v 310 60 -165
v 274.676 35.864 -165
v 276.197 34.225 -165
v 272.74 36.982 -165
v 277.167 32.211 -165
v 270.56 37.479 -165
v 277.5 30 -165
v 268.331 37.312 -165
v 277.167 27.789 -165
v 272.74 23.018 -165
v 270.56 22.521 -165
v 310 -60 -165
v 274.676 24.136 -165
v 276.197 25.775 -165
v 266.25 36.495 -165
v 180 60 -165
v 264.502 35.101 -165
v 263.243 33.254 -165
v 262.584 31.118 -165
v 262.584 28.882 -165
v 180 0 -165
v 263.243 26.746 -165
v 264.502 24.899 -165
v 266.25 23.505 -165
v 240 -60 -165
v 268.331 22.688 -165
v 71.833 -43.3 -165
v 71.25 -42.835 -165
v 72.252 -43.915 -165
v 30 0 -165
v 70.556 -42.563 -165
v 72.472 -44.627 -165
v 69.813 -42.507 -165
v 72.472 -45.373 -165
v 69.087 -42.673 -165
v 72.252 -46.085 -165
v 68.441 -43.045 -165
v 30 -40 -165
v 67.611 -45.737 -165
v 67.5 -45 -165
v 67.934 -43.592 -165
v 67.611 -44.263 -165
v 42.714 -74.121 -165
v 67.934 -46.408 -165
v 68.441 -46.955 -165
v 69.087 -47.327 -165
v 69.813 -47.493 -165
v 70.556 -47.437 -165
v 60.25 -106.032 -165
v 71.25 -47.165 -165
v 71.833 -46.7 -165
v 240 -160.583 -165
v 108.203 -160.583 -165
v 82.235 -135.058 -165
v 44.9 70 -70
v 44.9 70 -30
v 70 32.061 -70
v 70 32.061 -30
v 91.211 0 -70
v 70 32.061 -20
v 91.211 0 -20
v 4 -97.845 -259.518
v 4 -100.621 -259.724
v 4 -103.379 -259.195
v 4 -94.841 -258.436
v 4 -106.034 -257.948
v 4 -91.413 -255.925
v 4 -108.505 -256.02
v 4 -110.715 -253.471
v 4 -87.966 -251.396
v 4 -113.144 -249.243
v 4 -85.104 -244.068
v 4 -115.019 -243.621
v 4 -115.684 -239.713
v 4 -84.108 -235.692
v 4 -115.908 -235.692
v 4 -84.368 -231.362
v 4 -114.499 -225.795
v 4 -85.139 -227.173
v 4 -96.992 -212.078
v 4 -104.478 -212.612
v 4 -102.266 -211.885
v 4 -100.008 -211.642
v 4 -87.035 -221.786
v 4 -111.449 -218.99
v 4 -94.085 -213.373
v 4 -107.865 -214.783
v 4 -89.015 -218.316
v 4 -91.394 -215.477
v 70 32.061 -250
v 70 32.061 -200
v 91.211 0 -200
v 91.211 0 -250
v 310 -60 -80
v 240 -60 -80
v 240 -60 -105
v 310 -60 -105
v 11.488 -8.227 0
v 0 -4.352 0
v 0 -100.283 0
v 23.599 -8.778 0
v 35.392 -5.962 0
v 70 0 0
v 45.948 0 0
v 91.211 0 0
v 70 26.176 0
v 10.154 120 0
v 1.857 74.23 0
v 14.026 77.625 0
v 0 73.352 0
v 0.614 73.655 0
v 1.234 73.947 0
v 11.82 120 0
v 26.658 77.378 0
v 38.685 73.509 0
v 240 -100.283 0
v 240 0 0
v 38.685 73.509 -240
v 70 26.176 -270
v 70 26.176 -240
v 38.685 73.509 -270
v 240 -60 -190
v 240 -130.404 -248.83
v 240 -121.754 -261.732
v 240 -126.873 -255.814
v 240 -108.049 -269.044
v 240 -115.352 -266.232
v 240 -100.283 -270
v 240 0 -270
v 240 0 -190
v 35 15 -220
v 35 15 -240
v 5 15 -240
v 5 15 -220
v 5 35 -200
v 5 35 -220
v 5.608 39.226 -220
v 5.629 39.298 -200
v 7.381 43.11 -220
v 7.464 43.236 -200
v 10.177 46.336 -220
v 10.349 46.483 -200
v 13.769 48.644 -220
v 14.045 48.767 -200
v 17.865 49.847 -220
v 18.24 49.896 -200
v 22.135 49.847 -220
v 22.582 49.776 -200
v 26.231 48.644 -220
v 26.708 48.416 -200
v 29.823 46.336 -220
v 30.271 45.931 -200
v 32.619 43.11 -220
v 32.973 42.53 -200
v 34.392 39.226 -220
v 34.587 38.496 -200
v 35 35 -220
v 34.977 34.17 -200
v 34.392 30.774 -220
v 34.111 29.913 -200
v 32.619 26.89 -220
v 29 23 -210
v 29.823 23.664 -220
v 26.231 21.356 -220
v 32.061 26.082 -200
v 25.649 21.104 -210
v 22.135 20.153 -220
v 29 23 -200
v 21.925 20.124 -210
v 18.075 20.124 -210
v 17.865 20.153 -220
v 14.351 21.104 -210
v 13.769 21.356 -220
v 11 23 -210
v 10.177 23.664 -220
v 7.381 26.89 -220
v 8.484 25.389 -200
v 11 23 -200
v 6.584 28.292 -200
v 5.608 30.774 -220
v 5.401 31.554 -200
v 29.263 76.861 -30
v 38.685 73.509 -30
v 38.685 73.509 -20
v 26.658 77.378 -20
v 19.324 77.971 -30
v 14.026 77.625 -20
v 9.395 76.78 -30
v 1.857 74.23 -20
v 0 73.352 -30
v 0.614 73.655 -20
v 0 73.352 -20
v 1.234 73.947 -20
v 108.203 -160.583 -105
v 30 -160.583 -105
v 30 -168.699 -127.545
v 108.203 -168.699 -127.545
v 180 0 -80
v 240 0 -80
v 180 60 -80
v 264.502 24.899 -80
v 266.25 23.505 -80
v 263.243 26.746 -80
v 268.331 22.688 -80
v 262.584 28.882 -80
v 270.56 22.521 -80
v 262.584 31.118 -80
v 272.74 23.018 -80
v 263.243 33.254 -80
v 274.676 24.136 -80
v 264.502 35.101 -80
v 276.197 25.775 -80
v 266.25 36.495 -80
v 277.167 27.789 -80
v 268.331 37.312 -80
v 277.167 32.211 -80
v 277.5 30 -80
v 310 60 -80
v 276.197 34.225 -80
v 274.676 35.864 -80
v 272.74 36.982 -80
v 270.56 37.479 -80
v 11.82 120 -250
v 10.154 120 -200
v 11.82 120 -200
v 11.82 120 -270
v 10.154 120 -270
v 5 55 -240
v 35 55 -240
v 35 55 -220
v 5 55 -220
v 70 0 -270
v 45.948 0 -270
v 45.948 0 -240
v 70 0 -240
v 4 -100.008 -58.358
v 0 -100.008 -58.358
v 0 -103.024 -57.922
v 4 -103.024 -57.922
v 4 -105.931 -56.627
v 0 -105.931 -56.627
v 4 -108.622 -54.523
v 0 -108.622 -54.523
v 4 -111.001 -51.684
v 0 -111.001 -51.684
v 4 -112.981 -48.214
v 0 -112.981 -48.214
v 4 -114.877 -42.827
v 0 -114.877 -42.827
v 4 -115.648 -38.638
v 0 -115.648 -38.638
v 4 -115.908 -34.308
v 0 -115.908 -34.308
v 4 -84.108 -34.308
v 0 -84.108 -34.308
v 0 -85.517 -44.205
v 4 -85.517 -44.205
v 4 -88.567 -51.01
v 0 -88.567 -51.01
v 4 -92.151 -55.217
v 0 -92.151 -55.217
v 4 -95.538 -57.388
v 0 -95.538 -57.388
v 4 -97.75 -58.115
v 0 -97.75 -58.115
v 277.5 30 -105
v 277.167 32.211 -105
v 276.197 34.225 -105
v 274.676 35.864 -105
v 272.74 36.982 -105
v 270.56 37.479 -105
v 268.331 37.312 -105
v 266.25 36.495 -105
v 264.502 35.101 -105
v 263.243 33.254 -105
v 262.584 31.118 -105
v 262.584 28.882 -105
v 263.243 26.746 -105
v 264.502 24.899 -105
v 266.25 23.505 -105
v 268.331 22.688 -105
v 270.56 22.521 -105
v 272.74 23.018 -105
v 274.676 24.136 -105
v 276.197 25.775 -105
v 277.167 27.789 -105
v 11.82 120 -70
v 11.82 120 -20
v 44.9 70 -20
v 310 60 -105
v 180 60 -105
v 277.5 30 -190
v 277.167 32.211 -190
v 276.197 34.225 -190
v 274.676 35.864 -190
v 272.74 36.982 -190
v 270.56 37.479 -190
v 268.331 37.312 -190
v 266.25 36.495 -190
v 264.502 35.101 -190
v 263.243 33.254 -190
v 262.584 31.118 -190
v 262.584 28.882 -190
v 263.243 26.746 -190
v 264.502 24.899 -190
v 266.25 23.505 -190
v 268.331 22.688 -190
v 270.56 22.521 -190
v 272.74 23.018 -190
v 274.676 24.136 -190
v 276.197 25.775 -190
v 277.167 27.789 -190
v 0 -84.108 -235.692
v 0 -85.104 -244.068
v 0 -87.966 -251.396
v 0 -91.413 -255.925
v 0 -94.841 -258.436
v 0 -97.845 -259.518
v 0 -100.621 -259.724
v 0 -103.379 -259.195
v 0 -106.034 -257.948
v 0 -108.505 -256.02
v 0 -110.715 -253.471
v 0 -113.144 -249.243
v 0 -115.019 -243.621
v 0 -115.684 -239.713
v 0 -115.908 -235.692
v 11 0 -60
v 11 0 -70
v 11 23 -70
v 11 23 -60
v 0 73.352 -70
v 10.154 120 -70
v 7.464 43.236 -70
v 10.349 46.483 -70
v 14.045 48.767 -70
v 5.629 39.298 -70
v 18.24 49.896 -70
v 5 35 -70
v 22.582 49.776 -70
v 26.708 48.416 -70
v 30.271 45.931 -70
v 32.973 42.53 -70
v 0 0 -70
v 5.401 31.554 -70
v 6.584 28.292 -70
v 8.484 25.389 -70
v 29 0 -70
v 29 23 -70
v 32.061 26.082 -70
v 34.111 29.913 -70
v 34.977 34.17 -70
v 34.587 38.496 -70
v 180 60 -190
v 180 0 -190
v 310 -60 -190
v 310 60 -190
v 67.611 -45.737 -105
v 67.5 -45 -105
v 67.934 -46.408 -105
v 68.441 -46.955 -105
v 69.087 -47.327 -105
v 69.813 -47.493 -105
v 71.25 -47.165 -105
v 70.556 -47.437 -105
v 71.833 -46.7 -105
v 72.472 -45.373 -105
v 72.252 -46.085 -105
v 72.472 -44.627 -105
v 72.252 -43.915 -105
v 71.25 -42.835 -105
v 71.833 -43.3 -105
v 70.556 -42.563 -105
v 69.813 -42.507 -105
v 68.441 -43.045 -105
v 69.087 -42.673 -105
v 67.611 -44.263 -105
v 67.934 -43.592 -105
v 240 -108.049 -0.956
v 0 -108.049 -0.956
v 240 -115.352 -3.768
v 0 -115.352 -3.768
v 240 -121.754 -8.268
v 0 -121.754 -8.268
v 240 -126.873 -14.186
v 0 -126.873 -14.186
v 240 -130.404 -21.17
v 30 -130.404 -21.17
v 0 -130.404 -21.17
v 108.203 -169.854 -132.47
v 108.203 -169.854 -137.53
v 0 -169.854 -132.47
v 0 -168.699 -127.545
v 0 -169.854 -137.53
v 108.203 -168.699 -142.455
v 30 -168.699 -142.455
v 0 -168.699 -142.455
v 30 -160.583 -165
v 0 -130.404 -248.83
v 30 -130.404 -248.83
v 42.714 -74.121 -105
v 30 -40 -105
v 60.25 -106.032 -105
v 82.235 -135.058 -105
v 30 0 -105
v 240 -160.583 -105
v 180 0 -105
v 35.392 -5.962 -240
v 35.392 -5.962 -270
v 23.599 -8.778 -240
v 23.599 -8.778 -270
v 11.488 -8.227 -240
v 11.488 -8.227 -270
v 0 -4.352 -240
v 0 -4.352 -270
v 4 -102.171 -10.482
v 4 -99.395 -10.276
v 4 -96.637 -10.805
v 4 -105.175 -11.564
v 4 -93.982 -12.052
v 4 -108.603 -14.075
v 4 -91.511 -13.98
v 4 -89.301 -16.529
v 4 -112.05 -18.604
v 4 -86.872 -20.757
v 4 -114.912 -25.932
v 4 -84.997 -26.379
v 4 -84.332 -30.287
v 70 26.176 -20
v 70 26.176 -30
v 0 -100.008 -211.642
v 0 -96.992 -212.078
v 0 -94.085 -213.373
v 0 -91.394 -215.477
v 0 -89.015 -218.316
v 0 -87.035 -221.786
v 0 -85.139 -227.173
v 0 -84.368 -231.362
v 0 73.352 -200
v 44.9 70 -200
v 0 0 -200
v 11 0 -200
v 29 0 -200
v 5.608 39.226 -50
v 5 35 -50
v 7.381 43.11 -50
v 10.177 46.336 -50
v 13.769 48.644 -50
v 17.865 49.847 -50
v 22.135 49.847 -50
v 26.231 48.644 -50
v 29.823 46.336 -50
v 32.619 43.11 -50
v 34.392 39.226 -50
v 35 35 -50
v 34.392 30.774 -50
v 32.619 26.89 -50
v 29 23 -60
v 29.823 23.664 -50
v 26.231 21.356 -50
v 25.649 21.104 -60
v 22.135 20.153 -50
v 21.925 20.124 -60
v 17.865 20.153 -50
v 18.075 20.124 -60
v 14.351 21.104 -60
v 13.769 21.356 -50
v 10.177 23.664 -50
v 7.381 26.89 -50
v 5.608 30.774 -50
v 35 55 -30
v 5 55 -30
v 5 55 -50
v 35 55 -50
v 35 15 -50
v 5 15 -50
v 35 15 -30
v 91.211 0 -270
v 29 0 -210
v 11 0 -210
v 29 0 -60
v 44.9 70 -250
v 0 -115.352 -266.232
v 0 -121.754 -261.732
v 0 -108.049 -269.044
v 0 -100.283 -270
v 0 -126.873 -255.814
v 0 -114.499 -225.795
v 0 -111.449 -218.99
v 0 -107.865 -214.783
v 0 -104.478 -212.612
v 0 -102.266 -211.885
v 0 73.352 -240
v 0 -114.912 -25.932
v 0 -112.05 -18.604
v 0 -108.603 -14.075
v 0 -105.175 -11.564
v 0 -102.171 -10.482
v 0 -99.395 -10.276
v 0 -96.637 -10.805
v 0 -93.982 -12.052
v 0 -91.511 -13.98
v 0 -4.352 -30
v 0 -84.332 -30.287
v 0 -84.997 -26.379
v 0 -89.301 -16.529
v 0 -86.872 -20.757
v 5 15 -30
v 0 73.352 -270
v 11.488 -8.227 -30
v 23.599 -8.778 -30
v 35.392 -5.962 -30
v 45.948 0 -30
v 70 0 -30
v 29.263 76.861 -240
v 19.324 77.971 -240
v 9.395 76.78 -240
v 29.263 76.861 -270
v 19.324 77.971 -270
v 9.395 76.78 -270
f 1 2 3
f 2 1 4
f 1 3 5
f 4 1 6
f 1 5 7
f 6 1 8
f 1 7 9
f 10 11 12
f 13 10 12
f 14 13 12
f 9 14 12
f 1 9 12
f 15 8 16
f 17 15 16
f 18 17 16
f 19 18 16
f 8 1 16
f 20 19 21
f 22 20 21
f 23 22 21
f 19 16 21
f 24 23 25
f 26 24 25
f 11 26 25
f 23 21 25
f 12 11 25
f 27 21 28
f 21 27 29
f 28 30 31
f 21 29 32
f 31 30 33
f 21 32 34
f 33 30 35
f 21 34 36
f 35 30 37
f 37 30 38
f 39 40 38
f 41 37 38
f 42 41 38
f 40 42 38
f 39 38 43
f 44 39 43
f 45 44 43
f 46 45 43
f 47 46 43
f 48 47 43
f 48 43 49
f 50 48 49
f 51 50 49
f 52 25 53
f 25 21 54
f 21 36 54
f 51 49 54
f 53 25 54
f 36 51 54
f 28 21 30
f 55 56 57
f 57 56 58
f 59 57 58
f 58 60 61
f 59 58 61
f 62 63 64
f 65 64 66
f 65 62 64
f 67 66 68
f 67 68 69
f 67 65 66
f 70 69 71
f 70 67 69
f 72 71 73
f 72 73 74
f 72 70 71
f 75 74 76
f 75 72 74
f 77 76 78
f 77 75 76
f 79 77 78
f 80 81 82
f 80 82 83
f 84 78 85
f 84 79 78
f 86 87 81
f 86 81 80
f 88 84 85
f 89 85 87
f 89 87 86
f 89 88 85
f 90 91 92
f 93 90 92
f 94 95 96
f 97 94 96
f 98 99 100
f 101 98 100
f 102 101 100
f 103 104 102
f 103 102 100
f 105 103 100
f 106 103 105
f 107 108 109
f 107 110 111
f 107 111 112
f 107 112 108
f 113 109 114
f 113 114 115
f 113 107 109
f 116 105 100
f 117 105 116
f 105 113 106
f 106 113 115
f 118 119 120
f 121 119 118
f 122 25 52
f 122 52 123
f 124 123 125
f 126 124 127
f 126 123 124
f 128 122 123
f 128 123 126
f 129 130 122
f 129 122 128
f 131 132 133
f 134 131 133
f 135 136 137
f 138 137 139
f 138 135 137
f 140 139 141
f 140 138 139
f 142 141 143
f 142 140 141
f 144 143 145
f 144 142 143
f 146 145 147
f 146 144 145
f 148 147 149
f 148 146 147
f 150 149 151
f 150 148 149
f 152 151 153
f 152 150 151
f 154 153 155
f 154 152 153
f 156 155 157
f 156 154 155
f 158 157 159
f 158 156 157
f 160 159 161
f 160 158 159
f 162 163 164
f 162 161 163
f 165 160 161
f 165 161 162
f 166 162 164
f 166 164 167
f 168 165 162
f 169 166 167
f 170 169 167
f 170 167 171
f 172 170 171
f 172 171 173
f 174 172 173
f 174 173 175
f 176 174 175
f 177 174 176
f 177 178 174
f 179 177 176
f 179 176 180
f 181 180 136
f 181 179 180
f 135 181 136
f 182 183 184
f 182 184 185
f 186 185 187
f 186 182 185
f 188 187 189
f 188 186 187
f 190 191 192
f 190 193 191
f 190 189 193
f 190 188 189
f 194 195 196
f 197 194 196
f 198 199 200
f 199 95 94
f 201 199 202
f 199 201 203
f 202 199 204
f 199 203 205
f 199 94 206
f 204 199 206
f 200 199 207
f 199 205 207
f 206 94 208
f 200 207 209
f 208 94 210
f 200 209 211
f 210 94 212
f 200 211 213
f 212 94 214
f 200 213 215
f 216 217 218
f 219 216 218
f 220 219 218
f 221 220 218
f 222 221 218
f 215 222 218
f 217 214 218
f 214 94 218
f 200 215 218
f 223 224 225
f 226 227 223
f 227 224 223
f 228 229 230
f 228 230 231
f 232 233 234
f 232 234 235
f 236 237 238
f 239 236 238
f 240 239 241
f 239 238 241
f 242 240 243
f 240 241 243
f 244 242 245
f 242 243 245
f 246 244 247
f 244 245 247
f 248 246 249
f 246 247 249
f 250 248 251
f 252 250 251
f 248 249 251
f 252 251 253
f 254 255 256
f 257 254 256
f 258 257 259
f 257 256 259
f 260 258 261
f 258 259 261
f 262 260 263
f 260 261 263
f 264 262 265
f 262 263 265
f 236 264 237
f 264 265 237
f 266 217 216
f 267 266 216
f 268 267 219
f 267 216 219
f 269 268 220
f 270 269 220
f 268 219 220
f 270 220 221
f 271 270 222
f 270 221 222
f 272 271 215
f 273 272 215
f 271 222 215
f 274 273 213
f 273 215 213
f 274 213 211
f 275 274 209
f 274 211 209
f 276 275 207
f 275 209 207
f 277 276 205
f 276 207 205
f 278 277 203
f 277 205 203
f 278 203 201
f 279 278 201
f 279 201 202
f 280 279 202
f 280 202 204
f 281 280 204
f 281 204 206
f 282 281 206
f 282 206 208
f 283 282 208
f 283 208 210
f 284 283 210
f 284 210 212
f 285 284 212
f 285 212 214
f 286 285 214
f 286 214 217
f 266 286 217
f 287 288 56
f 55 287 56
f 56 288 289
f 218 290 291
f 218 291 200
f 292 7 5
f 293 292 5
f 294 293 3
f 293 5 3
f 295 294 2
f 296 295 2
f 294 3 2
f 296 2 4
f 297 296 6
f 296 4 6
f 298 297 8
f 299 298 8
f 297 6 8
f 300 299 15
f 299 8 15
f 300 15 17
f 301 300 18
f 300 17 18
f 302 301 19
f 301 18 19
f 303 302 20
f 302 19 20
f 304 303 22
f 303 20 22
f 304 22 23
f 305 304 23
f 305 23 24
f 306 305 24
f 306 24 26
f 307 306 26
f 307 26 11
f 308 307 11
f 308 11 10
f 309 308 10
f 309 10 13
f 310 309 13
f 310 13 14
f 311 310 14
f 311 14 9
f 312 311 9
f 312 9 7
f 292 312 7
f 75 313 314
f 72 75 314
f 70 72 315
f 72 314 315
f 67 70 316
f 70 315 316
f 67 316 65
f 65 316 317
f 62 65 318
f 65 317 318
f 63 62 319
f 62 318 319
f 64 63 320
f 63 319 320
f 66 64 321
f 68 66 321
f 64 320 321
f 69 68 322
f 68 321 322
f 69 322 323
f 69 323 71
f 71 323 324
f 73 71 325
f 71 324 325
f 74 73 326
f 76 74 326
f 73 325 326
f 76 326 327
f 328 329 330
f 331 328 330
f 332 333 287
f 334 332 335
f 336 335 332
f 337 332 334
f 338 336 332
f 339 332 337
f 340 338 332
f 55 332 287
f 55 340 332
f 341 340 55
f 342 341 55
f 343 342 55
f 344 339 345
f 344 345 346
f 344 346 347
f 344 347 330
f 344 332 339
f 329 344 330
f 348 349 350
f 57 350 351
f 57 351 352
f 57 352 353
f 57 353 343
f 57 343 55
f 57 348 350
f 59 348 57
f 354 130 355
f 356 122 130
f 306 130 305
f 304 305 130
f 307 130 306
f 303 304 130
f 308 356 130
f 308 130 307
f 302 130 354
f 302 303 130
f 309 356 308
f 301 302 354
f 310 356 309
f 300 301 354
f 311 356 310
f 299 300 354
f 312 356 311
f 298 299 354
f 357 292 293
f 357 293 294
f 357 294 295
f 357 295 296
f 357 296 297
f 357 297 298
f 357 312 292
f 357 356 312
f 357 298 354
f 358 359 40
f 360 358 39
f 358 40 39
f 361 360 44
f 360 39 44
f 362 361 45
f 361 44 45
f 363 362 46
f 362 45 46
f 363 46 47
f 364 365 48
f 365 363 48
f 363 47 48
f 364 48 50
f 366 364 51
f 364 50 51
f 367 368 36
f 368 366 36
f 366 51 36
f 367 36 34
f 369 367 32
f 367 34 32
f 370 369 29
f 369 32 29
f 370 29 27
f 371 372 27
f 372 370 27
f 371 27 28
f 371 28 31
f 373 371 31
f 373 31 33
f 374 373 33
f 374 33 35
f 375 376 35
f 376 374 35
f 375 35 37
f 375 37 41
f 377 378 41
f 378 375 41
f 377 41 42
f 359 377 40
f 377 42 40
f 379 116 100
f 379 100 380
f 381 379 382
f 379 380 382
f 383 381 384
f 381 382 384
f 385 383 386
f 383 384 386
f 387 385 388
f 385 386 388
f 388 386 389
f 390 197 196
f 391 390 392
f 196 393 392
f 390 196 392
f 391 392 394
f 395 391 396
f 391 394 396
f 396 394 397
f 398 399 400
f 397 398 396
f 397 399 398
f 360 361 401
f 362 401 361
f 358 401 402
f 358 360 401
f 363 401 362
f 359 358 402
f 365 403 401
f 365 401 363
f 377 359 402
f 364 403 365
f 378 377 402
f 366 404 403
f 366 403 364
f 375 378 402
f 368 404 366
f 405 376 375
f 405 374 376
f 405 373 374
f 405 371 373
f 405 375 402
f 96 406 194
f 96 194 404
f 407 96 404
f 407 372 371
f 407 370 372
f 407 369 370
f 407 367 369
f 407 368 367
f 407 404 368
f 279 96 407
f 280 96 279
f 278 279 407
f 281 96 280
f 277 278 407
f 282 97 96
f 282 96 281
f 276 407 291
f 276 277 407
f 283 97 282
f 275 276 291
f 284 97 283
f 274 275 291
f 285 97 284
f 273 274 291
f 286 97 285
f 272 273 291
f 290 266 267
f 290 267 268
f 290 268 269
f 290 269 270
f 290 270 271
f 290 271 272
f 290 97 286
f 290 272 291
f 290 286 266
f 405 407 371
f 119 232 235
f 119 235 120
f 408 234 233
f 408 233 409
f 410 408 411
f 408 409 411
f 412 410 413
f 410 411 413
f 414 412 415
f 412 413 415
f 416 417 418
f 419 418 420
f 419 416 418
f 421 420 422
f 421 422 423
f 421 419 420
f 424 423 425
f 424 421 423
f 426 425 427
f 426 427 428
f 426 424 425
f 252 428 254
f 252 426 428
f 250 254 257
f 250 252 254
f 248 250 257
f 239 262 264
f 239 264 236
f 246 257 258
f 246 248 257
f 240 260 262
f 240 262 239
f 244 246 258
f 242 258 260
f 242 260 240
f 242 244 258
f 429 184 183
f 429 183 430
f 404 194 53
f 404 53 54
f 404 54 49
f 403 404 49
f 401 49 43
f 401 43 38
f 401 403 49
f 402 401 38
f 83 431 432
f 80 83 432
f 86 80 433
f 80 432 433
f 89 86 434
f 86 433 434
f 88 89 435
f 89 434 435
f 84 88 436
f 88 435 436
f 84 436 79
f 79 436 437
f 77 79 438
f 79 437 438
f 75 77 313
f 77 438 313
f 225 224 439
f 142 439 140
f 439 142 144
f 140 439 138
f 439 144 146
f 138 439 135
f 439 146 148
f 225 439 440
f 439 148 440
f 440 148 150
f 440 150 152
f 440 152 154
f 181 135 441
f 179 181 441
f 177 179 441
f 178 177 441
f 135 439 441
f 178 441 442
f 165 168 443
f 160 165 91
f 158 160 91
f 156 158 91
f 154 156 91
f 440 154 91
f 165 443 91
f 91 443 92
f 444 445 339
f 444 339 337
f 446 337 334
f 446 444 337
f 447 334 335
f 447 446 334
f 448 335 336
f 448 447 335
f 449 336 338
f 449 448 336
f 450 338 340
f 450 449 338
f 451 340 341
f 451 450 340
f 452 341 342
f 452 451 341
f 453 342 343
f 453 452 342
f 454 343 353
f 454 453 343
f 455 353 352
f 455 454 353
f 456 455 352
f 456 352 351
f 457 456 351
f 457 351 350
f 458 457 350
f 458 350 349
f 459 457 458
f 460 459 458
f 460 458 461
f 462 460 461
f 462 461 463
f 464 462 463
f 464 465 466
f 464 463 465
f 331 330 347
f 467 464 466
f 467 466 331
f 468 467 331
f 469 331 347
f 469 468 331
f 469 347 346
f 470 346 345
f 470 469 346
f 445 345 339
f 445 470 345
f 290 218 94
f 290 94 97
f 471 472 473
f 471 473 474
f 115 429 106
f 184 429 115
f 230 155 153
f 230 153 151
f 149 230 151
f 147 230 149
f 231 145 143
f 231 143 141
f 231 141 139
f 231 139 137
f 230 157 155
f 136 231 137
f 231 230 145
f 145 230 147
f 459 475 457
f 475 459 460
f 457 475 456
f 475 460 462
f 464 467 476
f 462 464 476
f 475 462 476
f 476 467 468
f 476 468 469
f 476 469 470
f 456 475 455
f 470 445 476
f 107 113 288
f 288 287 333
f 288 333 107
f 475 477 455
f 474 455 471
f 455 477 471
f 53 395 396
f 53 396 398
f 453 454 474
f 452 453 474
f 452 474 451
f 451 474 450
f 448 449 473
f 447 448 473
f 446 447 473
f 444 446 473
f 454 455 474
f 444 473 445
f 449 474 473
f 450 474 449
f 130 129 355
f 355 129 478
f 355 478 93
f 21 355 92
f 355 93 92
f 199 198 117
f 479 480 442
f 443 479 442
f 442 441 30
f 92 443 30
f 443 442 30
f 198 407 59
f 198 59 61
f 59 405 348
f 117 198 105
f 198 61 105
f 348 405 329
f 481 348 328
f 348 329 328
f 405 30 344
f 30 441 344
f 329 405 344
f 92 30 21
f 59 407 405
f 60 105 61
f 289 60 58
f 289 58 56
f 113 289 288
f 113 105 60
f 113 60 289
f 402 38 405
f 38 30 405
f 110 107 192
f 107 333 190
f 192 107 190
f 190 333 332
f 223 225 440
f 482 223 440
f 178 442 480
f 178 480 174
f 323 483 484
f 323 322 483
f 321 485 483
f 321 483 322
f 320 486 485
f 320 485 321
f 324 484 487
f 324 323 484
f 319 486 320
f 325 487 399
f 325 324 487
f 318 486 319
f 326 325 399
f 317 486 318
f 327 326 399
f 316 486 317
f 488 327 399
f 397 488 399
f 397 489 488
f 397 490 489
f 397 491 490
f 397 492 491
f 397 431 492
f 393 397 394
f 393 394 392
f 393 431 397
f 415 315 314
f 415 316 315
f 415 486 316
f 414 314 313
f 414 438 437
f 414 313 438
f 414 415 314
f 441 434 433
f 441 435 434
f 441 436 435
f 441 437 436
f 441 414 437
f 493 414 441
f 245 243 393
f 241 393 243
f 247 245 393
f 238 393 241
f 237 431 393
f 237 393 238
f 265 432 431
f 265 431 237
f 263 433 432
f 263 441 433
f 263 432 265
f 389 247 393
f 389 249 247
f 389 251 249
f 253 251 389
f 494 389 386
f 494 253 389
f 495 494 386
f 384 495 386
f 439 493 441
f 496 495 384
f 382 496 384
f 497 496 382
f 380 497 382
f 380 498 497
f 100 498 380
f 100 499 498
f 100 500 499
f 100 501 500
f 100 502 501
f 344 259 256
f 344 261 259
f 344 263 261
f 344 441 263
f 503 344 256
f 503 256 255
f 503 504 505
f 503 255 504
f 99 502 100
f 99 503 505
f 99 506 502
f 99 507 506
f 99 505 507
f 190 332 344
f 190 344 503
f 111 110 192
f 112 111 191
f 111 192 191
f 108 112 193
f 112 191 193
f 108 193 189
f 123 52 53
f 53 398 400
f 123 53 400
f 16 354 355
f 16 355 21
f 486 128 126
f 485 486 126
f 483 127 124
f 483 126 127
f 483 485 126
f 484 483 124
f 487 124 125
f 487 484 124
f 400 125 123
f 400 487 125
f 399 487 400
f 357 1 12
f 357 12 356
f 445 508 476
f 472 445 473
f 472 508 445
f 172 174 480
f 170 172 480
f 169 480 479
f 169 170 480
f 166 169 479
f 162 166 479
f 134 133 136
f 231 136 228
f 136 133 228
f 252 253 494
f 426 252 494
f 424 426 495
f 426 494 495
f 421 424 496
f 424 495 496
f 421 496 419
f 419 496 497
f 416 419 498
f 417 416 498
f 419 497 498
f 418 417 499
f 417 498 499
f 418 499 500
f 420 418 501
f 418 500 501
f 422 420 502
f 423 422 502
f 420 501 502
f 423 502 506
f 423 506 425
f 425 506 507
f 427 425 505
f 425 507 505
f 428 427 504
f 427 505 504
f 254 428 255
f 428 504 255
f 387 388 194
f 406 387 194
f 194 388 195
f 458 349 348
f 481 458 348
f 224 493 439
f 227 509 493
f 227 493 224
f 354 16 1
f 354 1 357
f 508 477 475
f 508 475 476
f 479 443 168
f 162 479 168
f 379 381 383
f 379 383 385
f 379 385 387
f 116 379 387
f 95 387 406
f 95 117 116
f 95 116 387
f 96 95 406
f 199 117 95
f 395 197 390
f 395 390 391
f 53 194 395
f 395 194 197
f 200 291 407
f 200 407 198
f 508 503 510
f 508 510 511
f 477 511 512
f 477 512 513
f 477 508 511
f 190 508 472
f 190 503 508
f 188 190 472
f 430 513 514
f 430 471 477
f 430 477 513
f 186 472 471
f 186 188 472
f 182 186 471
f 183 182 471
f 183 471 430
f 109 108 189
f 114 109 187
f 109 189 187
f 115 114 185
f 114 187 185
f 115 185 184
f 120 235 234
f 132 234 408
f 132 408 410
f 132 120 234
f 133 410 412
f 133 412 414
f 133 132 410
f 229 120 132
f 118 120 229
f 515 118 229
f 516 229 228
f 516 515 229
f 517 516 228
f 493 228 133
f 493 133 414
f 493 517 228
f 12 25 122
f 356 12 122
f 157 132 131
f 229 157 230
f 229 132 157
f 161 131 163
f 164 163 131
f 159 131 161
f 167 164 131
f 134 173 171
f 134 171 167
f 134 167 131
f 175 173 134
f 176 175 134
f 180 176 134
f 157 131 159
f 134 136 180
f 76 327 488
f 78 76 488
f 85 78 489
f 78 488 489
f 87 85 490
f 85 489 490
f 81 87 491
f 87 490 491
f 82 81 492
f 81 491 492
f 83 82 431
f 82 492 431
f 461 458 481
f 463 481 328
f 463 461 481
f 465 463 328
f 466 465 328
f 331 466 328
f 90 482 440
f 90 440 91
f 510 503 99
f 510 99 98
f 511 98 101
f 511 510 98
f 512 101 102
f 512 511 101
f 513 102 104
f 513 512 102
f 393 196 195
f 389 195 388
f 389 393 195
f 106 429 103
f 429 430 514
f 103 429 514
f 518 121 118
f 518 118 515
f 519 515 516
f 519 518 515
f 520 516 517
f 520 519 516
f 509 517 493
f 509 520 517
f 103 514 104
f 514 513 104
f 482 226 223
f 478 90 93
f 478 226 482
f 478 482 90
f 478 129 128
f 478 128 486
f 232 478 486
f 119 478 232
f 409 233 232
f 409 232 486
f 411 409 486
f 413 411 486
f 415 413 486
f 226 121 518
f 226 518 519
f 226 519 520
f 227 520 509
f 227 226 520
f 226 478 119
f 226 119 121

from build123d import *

# Parameters (mm, degrees)
EXTRUDE_1_DEPTH           = 30
EXTRUDE_2_DEPTH           = 210
SKETCH_8_W                = 25
SKETCH_8_H                = 120
EXTRUDE_5_DEPTH           = 70
SKETCH_9_W                = 25
SKETCH_9_H                = 60
EXTRUDE_6_DEPTH           = 60
SKETCH_10_R               = 7.5
CUT_EXTRUDE_3_DEPTH       = 402.372644808
EXTRUDE_7_DEPTH           = 60
EXTRUDE_8_REACH           = 392.16
SKETCH_12_R               = 2.5
SKETCH_14_W               = 125
SKETCH_14_H               = 50
EXTRUDE_9_DEPTH           = 120
SKETCH_15_W               = 70
SKETCH_15_H               = 70
CUT_EXTRUDE_4_DEPTH       = 10
CUT_EXTRUDE_5_DEPTH       = 20
SKETCH_17_R               = 43.471266984
CUT_EXTRUDE_6_DEPTH       = 428.317212384
EXTRUDE_10_DEPTH          = 20
EXTRUDE_11_DEPTH          = 20
CUT_EXTRUDE_7_DEPTH       = 434.012701892
CUT_EXTRUDE_8_DEPTH       = 434.012701892
EXTRUDE_19_REACH          = 446.86
EXTRUDE_20_DEPTH          = 20
EXTRUDE_21_DEPTH          = 20
EXTRUDE_START             = 20
EXTRUDE_22_DEPTH          = 20
CUT_EXTRUDE_9_DEPTH       = 30
CUT_EXTRUDE_11_DEPTH      = 407.201920232
CUT_EXTRUDE_11_DEPTH_BACK = 407.201920232
SKETCH_29_R               = 15
EXTRUDE_23_DEPTH          = 78.20324
SKETCH_33_W               = 30
SKETCH_33_H               = 40
CUT_EXTRUDE_14_DEPTH      = 20
SKETCH_34_W               = 18
SKETCH_34_H               = 35.300600551
CUT_EXTRUDE_15_DEPTH      = 10
CUT_EXTRUDE_16_DEPTH      = 10
SKETCH_36_RX              = 24.05
SKETCH_36_RY              = 15.9
SKETCH_36_R               = 15.9
CUT_EXTRUDE_17_DEPTH      = 4


with BuildPart() as part:
    # 草图1 → 凸台-拉伸1 (new body)
    with BuildSketch(Plane(origin=(0, 0, 0), x_dir=(0, 0, -1), z_dir=(1, 0, 0))):
        with BuildLine():
            Line((0, 0), (270, 0))
            Line((270, 0), (270, -100.282814983))
            ThreePointArc((270, -100.282814983), (264.178138298, -118.691056762), (248.830033233, -130.404003019))
            Line((248.830033233, -130.404003019), (142.45524498, -168.69892679))
            ThreePointArc((142.45524498, -168.69892679), (135, -170), (127.54475502, -168.69892679))
            Line((127.54475502, -168.69892679), (21.169966767, -130.404003019))
            ThreePointArc((21.169966767, -130.404003019), (5.821861702, -118.691056762), (0, -100.282814983))
            Line((0, -100.282814983), (0, 0))
        make_face()
    extrude(amount=EXTRUDE_1_DEPTH)

    # 草图2 → 凸台-拉伸2 (add)
    with BuildSketch(Plane(origin=(30, 0, 0), x_dir=(0, 0, -1), z_dir=(1, 0, 0))):
        with BuildLine():
            Line((105, -160.582814983), (105, 0))
            Line((105, 0), (0, 0))
            Line((0, 0), (0, -100.282814983))
            ThreePointArc((0, -100.282814983), (5.821861702, -118.691056762), (21.169966767, -130.404003019))
            Line((21.169966767, -130.404003019), (105, -160.582814983))
        make_face()
        with BuildLine():
            Line((270, 0), (165, 0))
            Line((165, 0), (165, -160.582814983))
            Line((165, -160.582814983), (248.830033233, -130.404003019))
            ThreePointArc((248.830033233, -130.404003019), (264.178138298, -118.691056762), (270, -100.282814983))
            Line((270, -100.282814983), (270, 0))
        make_face()
    extrude(amount=EXTRUDE_2_DEPTH)

    # 草图8 → 凸台-拉伸5 (add)
    with BuildSketch(Plane(origin=(240, 0, 0), x_dir=(0, 0, -1), z_dir=(1, 0, 0))):
        with Locations((92.5, 0)):
            Rectangle(SKETCH_8_W, SKETCH_8_H)
        with Locations((177.5, 0)):
            Rectangle(SKETCH_8_W, SKETCH_8_H)
    extrude(amount=EXTRUDE_5_DEPTH)

    # 草图9 → 凸台-拉伸6 (add)
    with BuildSketch(Plane.ZY.offset(-240)):
        with Locations((-92.5, 30)):
            Rectangle(SKETCH_9_W, SKETCH_9_H)
        with Locations((-177.5, 30)):
            Rectangle(SKETCH_9_W, SKETCH_9_H)
    extrude(amount=EXTRUDE_6_DEPTH)

    # 草图10 → 切除-拉伸3 (cut, through all)
    with BuildSketch(Plane.XY.offset(-80)):
        with Locations((270, 30)):
            Circle(SKETCH_10_R)
    extrude(amount=-CUT_EXTRUDE_3_DEPTH, mode=Mode.SUBTRACT)

    # 草图11 → 凸台-拉伸7 (add)
    with BuildSketch(Plane(origin=(0, 0, -105), x_dir=(-1, 0, 0), z_dir=(0, 0, -1))):
        with BuildLine():
            Line((-30, -40), (-30, -160.582814983))
            Line((-30, -160.582814983), (-108.203242822, -160.582814983))
            ThreePointArc((-108.203242822, -160.582814983), (-60.24964282, -106.032303748), (-30, -40))
        make_face()
    extrude(amount=EXTRUDE_7_DEPTH)

    # 草图12 → 凸台-拉伸8 (add, up to next)
    with BuildSketch(Plane.XY.offset(-165), mode=Mode.PRIVATE) as extrude_8_sk1:
        with Locations(Location((70, -45, 0), (0, 0, 180))):
            Circle(SKETCH_12_R)
    extrude_8_tool1 = extrude(extrude_8_sk1.sketch, amount=EXTRUDE_8_REACH, mode=Mode.PRIVATE) - part.part
    add(extrude_8_tool1.solids().sort_by_distance((70, -45, -165))[0])

    # 草图14 → 凸台-拉伸9 (add)
    with BuildSketch(Plane(origin=(0, 0, 0), x_dir=(1, 0, 0), z_dir=(0, 1, 0))):
        with Locations((62.5, 225)):
            Rectangle(SKETCH_14_W, SKETCH_14_H)
        with Locations((62.5, 45)):
            Rectangle(SKETCH_14_W, SKETCH_14_H)
    extrude(amount=EXTRUDE_9_DEPTH)

    # 草图15 → 切除-拉伸4 (cut)
    with BuildSketch(Plane.XY.offset(-20)):
        with Locations((35, 35)):
            Rectangle(SKETCH_15_W, SKETCH_15_H)
    extrude(amount=-CUT_EXTRUDE_4_DEPTH, mode=Mode.SUBTRACT)

    # 草图16 → 切除-拉伸5 (cut)
    with BuildSketch(Plane.XY.offset(-30)):
        Polygon((35, 15), (5, 15), (5, 55), (35, 55), (35, 35), align=None)
    extrude(amount=-CUT_EXTRUDE_5_DEPTH, mode=Mode.SUBTRACT)

    # 草图17 → 切除-拉伸6 (cut, through all)
    with BuildSketch(Plane.XY.offset(-30)):
        with Locations((19.5, 34.5)):
            Circle(SKETCH_17_R)
    extrude(amount=CUT_EXTRUDE_6_DEPTH, mode=Mode.SUBTRACT)

    # 草图18 → 凸台-拉伸10 (add)
    with BuildSketch(Plane.XY.offset(-20)):
        Polygon((11.819921283, 120), (91.211474189, 0), (87.317867735, 0), (10.741661946, 115.744614613), align=None)
    extrude(amount=EXTRUDE_10_DEPTH)

    # 草图19 → 凸台-拉伸11 (add)
    with BuildSketch(Plane.XY.offset(-20)):
        with BuildLine():
            Line((1.857343832, 74.230186717), (10.856035233, 115.571739869))
            Line((10.856035233, 115.571739869), (10.741661946, 115.744614613))
            Line((10.741661946, 115.744614613), (11.819921283, 120))
            Line((11.819921283, 120), (10.153664863, 120))
            Line((10.153664863, 120), (0, 73.352297914))
            ThreePointArc((0, 73.352297914), (0.923485284, 73.80221564), (1.857343832, 74.230186717))
        make_face()
    extrude(amount=EXTRUDE_11_DEPTH)

    # 草图20 → 切除-拉伸7 (cut, through all)
    with BuildSketch(Plane.XY.offset(-20)):
        Polygon((0, 120), (0, 73.352297914), (10.153664863, 120), align=None)
    extrude(amount=-CUT_EXTRUDE_7_DEPTH, mode=Mode.SUBTRACT)

    # 草图22 → 切除-拉伸8 (cut, through all)
    with BuildSketch(Plane.XY.offset(-20)):
        Polygon((44.899734993, 70), (70, 32.061054476), (91.211474189, 0), (125, 0), (125, 120), (11.819921283, 120), align=None)
    extrude(amount=-CUT_EXTRUDE_8_DEPTH, mode=Mode.SUBTRACT)

    # 草图23 → 凸台-拉伸19 (add, up to next)
    with BuildSketch(Plane.XY, mode=Mode.PRIVATE) as extrude_19_sk1:
        with BuildLine():
            Line((87.317867735, 0), (91.211474189, 0))
            Line((91.211474189, 0), (11.819921283, 120))
            Line((11.819921283, 120), (10.153664863, 120))
            Line((10.153664863, 120), (0, 73.352297914))
            ThreePointArc((0, 73.352297914), (0.923485284, 73.80221564), (1.857343832, 74.230186717))
            Line((1.857343832, 74.230186717), (10.856035233, 115.571739869))
            Line((10.856035233, 115.571739869), (87.317867735, 0))
        make_face()
    extrude_19_tool1 = extrude(extrude_19_sk1.sketch, amount=-EXTRUDE_19_REACH, mode=Mode.PRIVATE) - part.part
    add(extrude_19_tool1.solids().sort_by_distance((89.264671, 1.5073, 0))[0])

    # 草图24 → 凸台-拉伸20 (add)
    with BuildSketch(Plane.XY.offset(-20)):
        Polygon((87.317867735, 0), (70, 26.175884614), (70, 0), align=None)
    extrude(amount=EXTRUDE_20_DEPTH)

    # 草图25 → 凸台-拉伸21 (add)
    with BuildSketch(Plane.XY.offset(-20)):
        with BuildLine():
            Line((38.684579851, 73.509011127), (10.856035233, 115.571739869))
            Line((10.856035233, 115.571739869), (1.857343832, 74.230186717))
            ThreePointArc((1.857343832, 74.230186717), (20.351120273, 77.962934179), (38.684579851, 73.509011127))
        make_face()
    extrude(amount=EXTRUDE_21_DEPTH)

    # 草图26 → 凸台-拉伸22 (add)
    with BuildSketch(Plane(origin=(0, 0, -250), x_dir=(-1, 0, 0), z_dir=(0, 0, -1)).offset(EXTRUDE_START)):
        with BuildLine():
            Line((-70, 26.175884614), (-38.684579851, 73.509011127))
            ThreePointArc((-38.684579851, 73.509011127), (-19.323897117, 77.970910285), (0, 73.352297914))
            Line((0, 73.352297914), (-10.153664863, 120))
            Line((-10.153664863, 120), (-11.819921283, 120))
            Line((-11.819921283, 120), (-91.211474189, 0))
            Line((-91.211474189, 0), (-240, 0))
            Line((-240, 0), (-240, -100.282814983))
            Line((-240, -100.282814983), (0, -100.282814983))
            Line((0, -100.282814983), (0, -4.352297914))
            ThreePointArc((0, -4.352297914), (-23.599339693, -8.77755154), (-45.948082222, 0))
            Line((-45.948082222, 0), (-70, 0))
            Line((-70, 0), (-70, 26.175884614))
        make_face()
    extrude(amount=-EXTRUDE_22_DEPTH)

    # 草图27 → 切除-拉伸9 (cut)
    with BuildSketch(Plane(origin=(0, 0, -270), x_dir=(-1, 0, 0), z_dir=(0, 0, -1))):
        with BuildLine():
            Line((-38.684579851, 73.509011127), (-70, 26.175884614))
            Line((-70, 26.175884614), (-70, 0))
            Line((-70, 0), (-45.948082222, 0))
            ThreePointArc((-45.948082222, 0), (-23.599339693, -8.77755154), (0, -4.352297914))
            Line((0, -4.352297914), (0, 73.352297914))
            ThreePointArc((0, 73.352297914), (-19.323897117, 77.970910285), (-38.684579851, 73.509011127))
        make_face()
    extrude(amount=-CUT_EXTRUDE_9_DEPTH, mode=Mode.SUBTRACT)

    # 草图29 → 切除-拉伸11 (cut, two sides: drawn at the far end of the back side and taken through both)
    with BuildSketch(Plane(origin=(0, 0, -70), x_dir=(-1, 0, 0), z_dir=(0, 0, -1)).offset(-CUT_EXTRUDE_11_DEPTH_BACK)):
        with Locations((-20, 35)):
            Circle(SKETCH_29_R)
    extrude(amount=CUT_EXTRUDE_11_DEPTH + CUT_EXTRUDE_11_DEPTH_BACK, mode=Mode.SUBTRACT)

    # 草图30 → 凸台-拉伸23 (add)
    with BuildSketch(Plane(origin=(30, 0, 0), x_dir=(0, 0, -1), z_dir=(1, 0, 0))):
        with BuildLine():
            Line((142.45524498, -168.69892679), (165, -160.582814983))
            Line((165, -160.582814983), (105, -160.582814983))
            Line((105, -160.582814983), (127.54475502, -168.69892679))
            ThreePointArc((127.54475502, -168.69892679), (135, -170), (142.45524498, -168.69892679))
        make_face()
    extrude(amount=EXTRUDE_23_DEPTH)

    # 草图33 → 切除-拉伸14 (cut)
    with BuildSketch(Plane(origin=(0, 0, -240), x_dir=(-1, 0, 0), z_dir=(0, 0, -1))):
        with Locations((-20, 35)):
            Rectangle(SKETCH_33_W, SKETCH_33_H)
    extrude(amount=-CUT_EXTRUDE_14_DEPTH, mode=Mode.SUBTRACT)

    # 草图34 → 切除-拉伸15 (cut)
    with BuildSketch(Plane.XY.offset(-200)):
        with Locations((20, 17.650300276)):
            Rectangle(SKETCH_34_W, SKETCH_34_H)
    extrude(amount=-CUT_EXTRUDE_15_DEPTH, mode=Mode.SUBTRACT)

    # 草图35 → 切除-拉伸16 (cut)
    with BuildSketch(Plane(origin=(0, 0, -70), x_dir=(-1, 0, 0), z_dir=(0, 0, -1))):
        with BuildLine():
            Line((-11, 0), (-11, 23))
            ThreePointArc((-11, 23), (-20, 20), (-29, 23))
            Line((-29, 23), (-29, 0))
            Line((-29, 0), (-11, 0))
        make_face()
    extrude(amount=-CUT_EXTRUDE_16_DEPTH, mode=Mode.SUBTRACT)

    # 草图36 → 切除-拉伸17 (cut)
    # profile 1 of 6: a face of its own
    with BuildSketch(Plane.ZY):
        with Locations((-235.69166945, -100.008005659)):
            Ellipse(SKETCH_36_RX, SKETCH_36_RY)
        with Locations((-235.69166945, -100.008005659)):
            Circle(SKETCH_36_R, mode=Mode.SUBTRACT)
    # profile 2 of 6: a face of its own
    with BuildSketch(Plane.ZY):
        with Locations((-235.69166945, -100.008005659)):
            Ellipse(SKETCH_36_RX, SKETCH_36_RY)
        with Locations((-235.69166945, -100.008005659)):
            Circle(SKETCH_36_R, mode=Mode.SUBTRACT)
    # profile 3 of 6: a face of its own
    with BuildSketch(Plane.ZY):
        with Locations((-235.69166945, -100.008005659)):
            Circle(SKETCH_36_R)
    # profile 4 of 6: a face of its own
    with BuildSketch(Plane.ZY):
        with Locations(Location((-34.30833055, -100.008005659), (0, 0, 180))):
            Ellipse(SKETCH_36_RX, SKETCH_36_RY)
        with Locations((-34.30833055, -100.008005659)):
            Circle(SKETCH_36_R, mode=Mode.SUBTRACT)
    # profile 5 of 6: a face of its own
    with BuildSketch(Plane.ZY):
        with Locations(Location((-34.30833055, -100.008005659), (0, 0, 180))):
            Ellipse(SKETCH_36_RX, SKETCH_36_RY)
        with Locations((-34.30833055, -100.008005659)):
            Circle(SKETCH_36_R, mode=Mode.SUBTRACT)
    # profile 6 of 6: a face of its own
    with BuildSketch(Plane.ZY):
        with Locations((-34.30833055, -100.008005659)):
            Circle(SKETCH_36_R)
    extrude(amount=-CUT_EXTRUDE_17_DEPTH, mode=Mode.SUBTRACT)


solid = part.part
